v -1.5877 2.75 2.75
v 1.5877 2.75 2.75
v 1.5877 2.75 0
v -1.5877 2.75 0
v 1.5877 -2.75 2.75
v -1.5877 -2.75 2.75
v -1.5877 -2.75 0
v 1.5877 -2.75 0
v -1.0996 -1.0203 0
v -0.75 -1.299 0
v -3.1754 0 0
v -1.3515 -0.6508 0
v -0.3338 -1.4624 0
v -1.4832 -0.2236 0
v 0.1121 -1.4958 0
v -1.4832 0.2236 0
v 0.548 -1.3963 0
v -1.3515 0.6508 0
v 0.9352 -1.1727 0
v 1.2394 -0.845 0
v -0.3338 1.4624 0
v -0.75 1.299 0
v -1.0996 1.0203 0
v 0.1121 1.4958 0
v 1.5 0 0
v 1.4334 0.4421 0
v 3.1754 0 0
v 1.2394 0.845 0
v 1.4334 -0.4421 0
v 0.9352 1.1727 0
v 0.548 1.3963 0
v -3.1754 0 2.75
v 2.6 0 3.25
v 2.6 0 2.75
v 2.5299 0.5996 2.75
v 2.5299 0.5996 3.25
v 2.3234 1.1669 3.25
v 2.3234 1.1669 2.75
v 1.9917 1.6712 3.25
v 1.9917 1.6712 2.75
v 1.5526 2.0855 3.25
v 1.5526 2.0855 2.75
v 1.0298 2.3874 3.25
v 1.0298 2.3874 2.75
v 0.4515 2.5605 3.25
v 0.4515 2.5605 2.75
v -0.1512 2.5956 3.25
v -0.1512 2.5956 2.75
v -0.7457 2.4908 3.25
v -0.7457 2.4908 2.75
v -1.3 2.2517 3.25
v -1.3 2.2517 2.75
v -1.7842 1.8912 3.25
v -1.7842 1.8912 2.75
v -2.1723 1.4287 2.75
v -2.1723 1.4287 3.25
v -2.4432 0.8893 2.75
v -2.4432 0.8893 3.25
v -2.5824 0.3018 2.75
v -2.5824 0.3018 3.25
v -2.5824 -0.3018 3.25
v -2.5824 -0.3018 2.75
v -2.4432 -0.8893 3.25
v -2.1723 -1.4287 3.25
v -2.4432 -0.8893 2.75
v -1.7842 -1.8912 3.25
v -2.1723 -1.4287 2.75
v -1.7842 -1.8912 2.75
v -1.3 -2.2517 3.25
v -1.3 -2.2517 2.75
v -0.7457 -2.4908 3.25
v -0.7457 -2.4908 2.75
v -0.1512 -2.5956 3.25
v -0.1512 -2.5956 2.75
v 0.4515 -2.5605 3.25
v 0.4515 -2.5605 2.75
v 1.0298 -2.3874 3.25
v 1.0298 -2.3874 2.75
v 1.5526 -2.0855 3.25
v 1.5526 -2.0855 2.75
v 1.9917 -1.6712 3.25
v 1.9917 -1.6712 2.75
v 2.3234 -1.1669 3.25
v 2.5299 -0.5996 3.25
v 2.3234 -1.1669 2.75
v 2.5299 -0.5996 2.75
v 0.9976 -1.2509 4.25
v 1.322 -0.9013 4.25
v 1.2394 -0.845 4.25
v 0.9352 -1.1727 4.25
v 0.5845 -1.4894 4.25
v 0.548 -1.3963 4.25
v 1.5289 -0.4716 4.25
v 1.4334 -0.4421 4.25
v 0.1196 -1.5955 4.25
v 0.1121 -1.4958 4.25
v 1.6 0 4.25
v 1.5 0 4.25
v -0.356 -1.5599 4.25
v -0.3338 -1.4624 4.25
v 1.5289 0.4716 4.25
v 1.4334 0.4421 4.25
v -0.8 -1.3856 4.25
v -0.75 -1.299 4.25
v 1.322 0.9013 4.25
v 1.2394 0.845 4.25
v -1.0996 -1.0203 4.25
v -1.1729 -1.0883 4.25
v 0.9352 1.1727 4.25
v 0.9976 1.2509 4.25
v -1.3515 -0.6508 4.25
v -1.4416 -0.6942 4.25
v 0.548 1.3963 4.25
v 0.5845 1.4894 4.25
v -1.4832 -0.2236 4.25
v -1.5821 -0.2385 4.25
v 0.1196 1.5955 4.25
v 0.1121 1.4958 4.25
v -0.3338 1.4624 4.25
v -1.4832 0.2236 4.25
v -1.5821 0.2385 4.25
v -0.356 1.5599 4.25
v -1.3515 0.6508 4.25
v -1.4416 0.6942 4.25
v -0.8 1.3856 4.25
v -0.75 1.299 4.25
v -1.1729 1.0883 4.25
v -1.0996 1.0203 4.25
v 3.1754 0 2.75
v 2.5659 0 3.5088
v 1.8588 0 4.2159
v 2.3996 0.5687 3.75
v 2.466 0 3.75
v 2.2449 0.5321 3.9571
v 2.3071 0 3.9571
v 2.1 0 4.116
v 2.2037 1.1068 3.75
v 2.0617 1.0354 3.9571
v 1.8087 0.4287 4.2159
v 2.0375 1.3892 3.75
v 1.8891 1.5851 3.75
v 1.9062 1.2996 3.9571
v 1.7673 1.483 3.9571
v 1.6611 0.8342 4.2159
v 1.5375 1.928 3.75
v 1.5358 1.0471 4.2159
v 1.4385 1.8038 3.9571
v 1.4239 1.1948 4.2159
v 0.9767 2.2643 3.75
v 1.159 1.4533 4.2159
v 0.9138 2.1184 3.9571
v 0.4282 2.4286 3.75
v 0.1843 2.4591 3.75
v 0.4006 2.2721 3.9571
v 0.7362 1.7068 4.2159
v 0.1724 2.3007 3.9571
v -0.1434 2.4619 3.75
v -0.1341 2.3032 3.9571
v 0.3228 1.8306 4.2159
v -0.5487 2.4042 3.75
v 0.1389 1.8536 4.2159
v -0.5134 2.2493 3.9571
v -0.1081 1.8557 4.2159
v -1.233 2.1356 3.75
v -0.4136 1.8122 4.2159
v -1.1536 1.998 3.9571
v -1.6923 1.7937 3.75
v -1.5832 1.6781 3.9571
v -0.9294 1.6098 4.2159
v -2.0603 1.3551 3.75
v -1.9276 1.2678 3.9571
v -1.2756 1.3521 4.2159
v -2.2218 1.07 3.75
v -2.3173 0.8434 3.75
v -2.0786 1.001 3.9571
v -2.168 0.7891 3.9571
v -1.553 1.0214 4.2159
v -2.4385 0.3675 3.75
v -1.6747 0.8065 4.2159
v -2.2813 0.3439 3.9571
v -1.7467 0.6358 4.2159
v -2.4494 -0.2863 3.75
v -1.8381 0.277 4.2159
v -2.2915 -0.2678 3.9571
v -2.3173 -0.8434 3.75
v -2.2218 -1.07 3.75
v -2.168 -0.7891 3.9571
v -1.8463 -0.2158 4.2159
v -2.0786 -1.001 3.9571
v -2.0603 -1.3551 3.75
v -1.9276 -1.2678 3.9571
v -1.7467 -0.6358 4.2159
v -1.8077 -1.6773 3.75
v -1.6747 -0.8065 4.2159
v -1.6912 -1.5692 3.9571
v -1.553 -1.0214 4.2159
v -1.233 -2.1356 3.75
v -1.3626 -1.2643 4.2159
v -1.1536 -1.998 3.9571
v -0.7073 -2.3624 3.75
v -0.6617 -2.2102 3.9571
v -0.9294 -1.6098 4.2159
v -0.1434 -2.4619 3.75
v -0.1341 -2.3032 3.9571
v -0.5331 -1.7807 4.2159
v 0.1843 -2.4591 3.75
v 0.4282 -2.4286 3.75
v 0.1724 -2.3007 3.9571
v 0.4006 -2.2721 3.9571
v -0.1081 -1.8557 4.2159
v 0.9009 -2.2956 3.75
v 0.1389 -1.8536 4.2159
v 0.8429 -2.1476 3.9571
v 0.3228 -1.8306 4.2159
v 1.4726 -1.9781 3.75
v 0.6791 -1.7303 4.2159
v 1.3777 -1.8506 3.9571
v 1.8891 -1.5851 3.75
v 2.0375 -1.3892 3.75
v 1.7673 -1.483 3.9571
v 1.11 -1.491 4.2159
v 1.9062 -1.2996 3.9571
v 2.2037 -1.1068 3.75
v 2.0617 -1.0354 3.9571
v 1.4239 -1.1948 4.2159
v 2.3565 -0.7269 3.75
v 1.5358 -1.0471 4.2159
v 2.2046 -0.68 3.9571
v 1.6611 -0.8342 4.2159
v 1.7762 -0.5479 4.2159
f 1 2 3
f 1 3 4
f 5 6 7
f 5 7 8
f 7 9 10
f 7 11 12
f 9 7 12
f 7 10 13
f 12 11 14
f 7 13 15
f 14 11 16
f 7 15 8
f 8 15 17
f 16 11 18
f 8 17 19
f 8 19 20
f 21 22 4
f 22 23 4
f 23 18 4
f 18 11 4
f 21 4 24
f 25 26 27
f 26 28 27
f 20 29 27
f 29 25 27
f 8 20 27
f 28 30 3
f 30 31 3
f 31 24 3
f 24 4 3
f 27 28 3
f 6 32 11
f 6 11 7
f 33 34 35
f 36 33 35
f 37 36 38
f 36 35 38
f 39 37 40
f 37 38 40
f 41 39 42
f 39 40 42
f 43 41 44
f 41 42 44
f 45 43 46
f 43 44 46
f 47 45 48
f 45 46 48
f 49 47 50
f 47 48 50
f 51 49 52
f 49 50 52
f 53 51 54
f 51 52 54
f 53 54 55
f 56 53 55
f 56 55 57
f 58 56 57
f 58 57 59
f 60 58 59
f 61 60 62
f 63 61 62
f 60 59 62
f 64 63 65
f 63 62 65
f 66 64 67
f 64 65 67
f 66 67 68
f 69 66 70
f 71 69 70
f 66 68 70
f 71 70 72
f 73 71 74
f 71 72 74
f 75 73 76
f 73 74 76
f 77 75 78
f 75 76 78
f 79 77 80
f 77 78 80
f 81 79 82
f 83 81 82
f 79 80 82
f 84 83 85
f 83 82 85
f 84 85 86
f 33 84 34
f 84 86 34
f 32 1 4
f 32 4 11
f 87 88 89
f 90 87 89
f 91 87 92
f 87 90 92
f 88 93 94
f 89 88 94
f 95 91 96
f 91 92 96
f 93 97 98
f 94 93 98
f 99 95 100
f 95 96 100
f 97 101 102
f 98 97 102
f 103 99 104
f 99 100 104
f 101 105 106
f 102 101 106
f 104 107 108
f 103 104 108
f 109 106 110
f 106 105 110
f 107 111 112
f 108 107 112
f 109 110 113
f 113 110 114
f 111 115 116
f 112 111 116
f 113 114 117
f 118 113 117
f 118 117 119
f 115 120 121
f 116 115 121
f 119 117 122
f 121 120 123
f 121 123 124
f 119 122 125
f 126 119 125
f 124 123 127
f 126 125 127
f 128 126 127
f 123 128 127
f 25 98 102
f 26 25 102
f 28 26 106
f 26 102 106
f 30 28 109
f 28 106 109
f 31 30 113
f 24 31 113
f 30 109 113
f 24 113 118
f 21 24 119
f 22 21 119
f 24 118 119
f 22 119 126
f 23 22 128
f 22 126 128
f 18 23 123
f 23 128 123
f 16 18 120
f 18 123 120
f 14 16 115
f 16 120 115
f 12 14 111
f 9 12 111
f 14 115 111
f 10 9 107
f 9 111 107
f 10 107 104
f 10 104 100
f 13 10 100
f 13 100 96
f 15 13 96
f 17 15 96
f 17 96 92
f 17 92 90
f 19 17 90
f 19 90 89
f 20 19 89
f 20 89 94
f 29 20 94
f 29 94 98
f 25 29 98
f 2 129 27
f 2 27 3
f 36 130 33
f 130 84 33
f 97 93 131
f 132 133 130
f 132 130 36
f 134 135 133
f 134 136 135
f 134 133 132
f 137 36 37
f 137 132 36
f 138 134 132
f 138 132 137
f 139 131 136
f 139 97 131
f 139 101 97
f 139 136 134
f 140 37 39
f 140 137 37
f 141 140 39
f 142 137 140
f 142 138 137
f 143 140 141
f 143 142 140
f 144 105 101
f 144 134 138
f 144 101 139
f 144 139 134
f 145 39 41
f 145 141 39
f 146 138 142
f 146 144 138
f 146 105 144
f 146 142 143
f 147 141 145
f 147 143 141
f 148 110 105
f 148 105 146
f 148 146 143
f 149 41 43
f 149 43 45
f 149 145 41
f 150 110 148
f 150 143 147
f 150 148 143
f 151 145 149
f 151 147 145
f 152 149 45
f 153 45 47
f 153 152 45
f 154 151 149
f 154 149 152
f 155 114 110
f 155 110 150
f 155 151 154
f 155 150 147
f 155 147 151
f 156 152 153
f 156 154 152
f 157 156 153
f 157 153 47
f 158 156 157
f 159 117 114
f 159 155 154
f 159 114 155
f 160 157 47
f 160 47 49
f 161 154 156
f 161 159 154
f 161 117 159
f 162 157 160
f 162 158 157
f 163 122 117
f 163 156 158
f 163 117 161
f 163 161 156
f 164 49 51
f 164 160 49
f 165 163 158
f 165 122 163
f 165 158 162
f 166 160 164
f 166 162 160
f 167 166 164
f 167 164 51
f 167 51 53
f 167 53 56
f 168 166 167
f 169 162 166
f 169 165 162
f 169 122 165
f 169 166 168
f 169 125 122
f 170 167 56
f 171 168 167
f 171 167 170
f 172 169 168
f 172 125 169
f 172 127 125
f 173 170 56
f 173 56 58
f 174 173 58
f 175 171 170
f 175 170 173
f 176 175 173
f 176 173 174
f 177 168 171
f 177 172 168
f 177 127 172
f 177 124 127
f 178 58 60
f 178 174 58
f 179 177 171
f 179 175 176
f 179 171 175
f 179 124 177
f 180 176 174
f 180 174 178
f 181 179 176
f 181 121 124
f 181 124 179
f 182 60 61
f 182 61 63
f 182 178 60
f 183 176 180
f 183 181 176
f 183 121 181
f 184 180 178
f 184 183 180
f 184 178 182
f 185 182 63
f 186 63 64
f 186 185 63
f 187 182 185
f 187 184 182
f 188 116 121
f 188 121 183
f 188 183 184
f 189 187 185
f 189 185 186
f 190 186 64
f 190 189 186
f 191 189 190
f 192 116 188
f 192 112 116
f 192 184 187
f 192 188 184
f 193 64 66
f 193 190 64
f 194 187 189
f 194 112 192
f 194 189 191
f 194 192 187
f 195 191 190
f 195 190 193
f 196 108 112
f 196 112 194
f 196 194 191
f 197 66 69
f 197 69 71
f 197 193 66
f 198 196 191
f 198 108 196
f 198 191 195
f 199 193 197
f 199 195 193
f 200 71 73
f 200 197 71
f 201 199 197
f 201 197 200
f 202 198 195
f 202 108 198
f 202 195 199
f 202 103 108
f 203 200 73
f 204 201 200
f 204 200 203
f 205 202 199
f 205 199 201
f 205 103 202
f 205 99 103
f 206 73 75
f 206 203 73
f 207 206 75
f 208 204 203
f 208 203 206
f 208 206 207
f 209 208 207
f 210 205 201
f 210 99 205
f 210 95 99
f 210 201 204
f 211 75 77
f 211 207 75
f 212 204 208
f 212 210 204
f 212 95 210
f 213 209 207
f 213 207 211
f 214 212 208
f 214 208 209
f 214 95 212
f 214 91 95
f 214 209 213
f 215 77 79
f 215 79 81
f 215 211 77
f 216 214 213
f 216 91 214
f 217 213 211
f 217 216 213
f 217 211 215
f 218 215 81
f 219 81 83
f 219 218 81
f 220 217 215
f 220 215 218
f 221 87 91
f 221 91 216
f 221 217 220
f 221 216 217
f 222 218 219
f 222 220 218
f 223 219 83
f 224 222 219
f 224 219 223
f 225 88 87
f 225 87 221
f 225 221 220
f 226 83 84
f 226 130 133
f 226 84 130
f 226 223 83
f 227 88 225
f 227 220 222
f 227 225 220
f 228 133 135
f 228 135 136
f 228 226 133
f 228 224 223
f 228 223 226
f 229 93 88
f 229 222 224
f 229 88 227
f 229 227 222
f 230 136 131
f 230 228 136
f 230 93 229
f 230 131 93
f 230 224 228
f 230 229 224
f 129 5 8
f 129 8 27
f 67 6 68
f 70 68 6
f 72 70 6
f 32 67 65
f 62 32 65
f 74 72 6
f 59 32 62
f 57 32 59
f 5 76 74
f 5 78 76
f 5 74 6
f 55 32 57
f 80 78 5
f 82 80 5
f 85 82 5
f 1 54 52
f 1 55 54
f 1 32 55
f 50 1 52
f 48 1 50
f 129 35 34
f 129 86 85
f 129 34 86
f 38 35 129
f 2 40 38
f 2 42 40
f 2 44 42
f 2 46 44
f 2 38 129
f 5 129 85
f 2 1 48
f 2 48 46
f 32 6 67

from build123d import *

# Parameters (mm, degrees)
EXTRUDE_1_DEPTH           = 2.75
SKETCH_2_W                = 2.6
SKETCH_2_H                = 1.5
HOLE_WIZARD_3_0_3_1_D     = 3
HOLE_WIZARD_3_0_3_1_DEPTH = 4.25
FILLET_1_R                = 1


with BuildPart() as part:
    # 草图1 → 凸台-拉伸1 (new body)
    with BuildSketch(Plane.XY.offset(2.75)):
        Polygon((1.58771324, -2.75), (3.175426481, 0), (1.58771324, 2.75), (-1.58771324, 2.75), (-3.175426481, 0), (-1.58771324, -2.75), align=None)
    extrude(amount=-EXTRUDE_1_DEPTH)

    # 草图2 → 旋转1 (revolve)
    with BuildSketch(Plane(origin=(0, 0, 0), x_dir=(1, 0, 0), z_dir=(0, 1, 0))):
        with Locations((1.3, -3.5)):
            Rectangle(SKETCH_2_W, SKETCH_2_H)
    revolve(axis=Axis((0, 0, 2.75), (0, 0, 1)))

    # Ø3.0 (3) 直径孔1
    with Locations(Plane(origin=(0, 0, 0), x_dir=(-1, 0, 0), z_dir=(0, 0, -1))):
        with Locations((0, 0)):
            Hole(HOLE_WIZARD_3_0_3_1_D / 2, depth=HOLE_WIZARD_3_0_3_1_DEPTH)

    # 圆角1
    fillet_1_edges = [part.edges().sort_by_distance(p)[0] for p in [
        (-2.6, 0, 4.25),
    ]]
    fillet(fillet_1_edges, radius=FILLET_1_R)


solid = part.part
